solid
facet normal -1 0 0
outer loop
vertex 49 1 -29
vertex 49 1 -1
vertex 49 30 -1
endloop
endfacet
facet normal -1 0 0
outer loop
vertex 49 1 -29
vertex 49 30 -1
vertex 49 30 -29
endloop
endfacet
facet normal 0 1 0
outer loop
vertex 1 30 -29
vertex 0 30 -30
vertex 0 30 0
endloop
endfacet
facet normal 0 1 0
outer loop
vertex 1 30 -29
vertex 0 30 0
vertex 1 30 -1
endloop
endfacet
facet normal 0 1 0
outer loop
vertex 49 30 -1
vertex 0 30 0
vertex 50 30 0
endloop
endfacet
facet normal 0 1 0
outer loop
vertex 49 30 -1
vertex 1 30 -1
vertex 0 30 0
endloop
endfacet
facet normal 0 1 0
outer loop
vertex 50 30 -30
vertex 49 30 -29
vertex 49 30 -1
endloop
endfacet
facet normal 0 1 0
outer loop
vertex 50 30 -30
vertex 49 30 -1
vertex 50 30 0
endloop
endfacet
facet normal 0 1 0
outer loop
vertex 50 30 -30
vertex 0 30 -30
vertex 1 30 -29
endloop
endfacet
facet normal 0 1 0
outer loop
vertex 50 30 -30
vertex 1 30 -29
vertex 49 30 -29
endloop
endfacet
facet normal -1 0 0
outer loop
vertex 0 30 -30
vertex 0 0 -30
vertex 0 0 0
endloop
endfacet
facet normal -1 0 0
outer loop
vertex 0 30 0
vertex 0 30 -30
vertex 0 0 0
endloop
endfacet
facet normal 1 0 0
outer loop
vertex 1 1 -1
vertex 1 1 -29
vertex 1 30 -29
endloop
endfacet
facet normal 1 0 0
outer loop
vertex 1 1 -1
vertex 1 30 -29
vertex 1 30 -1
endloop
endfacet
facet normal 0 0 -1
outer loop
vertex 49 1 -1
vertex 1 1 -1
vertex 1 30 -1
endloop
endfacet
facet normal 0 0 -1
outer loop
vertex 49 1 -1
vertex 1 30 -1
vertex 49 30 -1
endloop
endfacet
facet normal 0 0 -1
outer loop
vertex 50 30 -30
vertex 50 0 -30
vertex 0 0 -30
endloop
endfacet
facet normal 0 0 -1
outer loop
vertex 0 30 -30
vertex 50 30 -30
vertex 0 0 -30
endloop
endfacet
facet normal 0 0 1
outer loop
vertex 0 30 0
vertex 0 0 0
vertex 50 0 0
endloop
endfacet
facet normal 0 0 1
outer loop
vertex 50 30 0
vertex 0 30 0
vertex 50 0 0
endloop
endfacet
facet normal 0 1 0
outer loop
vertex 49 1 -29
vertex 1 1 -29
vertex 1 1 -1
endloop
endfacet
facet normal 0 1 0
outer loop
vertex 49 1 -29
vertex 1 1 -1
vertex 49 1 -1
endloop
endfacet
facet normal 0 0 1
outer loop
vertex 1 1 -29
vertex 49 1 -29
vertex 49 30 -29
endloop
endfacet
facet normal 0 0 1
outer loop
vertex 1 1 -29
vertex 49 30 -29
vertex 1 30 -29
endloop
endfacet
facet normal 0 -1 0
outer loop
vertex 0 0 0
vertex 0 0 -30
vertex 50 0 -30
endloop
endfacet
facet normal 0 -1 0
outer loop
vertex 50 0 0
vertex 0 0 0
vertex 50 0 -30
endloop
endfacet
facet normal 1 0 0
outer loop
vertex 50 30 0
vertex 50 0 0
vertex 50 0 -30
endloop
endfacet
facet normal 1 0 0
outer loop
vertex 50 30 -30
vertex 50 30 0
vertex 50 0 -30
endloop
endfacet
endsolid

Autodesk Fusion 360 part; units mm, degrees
sketch "Sketch1" plane through (0, 0, 0) normal (0, 1, 0) x (1, 0, 0)
  line L0 (0, 0) -> (50, 0)
  line L1 (50, 0) -> (50, 30)
  line L2 (50, 30) -> (0, 30)
  line L3 (0, 30) -> (0, 0)
  line L4 (49, 29) -> (1, 29)
  line L5 (1, 29) -> (1, 1)
  line L6 (1, 1) -> (49, 1)
  line L7 (49, 1) -> (49, 29)
  dimension "d16" = 50
  dimension "d17" = 30
extrude "Extrude5" add sketch "Sketch1" along normal blind 30
extrude "Extrude6" add sketch "Sketch1" along normal blind 1 contours L4 L5 L6 L7
equation "thickness = 1 mm"
equation "depth = 30 mm"
equation "width = 50 mm"
equation "height = 30 mm"
equation "d16 = width"
equation "d17 = depth"
equation "d18 = -thickness"
equation "d19 = height"
equation "d21 = thickness"
